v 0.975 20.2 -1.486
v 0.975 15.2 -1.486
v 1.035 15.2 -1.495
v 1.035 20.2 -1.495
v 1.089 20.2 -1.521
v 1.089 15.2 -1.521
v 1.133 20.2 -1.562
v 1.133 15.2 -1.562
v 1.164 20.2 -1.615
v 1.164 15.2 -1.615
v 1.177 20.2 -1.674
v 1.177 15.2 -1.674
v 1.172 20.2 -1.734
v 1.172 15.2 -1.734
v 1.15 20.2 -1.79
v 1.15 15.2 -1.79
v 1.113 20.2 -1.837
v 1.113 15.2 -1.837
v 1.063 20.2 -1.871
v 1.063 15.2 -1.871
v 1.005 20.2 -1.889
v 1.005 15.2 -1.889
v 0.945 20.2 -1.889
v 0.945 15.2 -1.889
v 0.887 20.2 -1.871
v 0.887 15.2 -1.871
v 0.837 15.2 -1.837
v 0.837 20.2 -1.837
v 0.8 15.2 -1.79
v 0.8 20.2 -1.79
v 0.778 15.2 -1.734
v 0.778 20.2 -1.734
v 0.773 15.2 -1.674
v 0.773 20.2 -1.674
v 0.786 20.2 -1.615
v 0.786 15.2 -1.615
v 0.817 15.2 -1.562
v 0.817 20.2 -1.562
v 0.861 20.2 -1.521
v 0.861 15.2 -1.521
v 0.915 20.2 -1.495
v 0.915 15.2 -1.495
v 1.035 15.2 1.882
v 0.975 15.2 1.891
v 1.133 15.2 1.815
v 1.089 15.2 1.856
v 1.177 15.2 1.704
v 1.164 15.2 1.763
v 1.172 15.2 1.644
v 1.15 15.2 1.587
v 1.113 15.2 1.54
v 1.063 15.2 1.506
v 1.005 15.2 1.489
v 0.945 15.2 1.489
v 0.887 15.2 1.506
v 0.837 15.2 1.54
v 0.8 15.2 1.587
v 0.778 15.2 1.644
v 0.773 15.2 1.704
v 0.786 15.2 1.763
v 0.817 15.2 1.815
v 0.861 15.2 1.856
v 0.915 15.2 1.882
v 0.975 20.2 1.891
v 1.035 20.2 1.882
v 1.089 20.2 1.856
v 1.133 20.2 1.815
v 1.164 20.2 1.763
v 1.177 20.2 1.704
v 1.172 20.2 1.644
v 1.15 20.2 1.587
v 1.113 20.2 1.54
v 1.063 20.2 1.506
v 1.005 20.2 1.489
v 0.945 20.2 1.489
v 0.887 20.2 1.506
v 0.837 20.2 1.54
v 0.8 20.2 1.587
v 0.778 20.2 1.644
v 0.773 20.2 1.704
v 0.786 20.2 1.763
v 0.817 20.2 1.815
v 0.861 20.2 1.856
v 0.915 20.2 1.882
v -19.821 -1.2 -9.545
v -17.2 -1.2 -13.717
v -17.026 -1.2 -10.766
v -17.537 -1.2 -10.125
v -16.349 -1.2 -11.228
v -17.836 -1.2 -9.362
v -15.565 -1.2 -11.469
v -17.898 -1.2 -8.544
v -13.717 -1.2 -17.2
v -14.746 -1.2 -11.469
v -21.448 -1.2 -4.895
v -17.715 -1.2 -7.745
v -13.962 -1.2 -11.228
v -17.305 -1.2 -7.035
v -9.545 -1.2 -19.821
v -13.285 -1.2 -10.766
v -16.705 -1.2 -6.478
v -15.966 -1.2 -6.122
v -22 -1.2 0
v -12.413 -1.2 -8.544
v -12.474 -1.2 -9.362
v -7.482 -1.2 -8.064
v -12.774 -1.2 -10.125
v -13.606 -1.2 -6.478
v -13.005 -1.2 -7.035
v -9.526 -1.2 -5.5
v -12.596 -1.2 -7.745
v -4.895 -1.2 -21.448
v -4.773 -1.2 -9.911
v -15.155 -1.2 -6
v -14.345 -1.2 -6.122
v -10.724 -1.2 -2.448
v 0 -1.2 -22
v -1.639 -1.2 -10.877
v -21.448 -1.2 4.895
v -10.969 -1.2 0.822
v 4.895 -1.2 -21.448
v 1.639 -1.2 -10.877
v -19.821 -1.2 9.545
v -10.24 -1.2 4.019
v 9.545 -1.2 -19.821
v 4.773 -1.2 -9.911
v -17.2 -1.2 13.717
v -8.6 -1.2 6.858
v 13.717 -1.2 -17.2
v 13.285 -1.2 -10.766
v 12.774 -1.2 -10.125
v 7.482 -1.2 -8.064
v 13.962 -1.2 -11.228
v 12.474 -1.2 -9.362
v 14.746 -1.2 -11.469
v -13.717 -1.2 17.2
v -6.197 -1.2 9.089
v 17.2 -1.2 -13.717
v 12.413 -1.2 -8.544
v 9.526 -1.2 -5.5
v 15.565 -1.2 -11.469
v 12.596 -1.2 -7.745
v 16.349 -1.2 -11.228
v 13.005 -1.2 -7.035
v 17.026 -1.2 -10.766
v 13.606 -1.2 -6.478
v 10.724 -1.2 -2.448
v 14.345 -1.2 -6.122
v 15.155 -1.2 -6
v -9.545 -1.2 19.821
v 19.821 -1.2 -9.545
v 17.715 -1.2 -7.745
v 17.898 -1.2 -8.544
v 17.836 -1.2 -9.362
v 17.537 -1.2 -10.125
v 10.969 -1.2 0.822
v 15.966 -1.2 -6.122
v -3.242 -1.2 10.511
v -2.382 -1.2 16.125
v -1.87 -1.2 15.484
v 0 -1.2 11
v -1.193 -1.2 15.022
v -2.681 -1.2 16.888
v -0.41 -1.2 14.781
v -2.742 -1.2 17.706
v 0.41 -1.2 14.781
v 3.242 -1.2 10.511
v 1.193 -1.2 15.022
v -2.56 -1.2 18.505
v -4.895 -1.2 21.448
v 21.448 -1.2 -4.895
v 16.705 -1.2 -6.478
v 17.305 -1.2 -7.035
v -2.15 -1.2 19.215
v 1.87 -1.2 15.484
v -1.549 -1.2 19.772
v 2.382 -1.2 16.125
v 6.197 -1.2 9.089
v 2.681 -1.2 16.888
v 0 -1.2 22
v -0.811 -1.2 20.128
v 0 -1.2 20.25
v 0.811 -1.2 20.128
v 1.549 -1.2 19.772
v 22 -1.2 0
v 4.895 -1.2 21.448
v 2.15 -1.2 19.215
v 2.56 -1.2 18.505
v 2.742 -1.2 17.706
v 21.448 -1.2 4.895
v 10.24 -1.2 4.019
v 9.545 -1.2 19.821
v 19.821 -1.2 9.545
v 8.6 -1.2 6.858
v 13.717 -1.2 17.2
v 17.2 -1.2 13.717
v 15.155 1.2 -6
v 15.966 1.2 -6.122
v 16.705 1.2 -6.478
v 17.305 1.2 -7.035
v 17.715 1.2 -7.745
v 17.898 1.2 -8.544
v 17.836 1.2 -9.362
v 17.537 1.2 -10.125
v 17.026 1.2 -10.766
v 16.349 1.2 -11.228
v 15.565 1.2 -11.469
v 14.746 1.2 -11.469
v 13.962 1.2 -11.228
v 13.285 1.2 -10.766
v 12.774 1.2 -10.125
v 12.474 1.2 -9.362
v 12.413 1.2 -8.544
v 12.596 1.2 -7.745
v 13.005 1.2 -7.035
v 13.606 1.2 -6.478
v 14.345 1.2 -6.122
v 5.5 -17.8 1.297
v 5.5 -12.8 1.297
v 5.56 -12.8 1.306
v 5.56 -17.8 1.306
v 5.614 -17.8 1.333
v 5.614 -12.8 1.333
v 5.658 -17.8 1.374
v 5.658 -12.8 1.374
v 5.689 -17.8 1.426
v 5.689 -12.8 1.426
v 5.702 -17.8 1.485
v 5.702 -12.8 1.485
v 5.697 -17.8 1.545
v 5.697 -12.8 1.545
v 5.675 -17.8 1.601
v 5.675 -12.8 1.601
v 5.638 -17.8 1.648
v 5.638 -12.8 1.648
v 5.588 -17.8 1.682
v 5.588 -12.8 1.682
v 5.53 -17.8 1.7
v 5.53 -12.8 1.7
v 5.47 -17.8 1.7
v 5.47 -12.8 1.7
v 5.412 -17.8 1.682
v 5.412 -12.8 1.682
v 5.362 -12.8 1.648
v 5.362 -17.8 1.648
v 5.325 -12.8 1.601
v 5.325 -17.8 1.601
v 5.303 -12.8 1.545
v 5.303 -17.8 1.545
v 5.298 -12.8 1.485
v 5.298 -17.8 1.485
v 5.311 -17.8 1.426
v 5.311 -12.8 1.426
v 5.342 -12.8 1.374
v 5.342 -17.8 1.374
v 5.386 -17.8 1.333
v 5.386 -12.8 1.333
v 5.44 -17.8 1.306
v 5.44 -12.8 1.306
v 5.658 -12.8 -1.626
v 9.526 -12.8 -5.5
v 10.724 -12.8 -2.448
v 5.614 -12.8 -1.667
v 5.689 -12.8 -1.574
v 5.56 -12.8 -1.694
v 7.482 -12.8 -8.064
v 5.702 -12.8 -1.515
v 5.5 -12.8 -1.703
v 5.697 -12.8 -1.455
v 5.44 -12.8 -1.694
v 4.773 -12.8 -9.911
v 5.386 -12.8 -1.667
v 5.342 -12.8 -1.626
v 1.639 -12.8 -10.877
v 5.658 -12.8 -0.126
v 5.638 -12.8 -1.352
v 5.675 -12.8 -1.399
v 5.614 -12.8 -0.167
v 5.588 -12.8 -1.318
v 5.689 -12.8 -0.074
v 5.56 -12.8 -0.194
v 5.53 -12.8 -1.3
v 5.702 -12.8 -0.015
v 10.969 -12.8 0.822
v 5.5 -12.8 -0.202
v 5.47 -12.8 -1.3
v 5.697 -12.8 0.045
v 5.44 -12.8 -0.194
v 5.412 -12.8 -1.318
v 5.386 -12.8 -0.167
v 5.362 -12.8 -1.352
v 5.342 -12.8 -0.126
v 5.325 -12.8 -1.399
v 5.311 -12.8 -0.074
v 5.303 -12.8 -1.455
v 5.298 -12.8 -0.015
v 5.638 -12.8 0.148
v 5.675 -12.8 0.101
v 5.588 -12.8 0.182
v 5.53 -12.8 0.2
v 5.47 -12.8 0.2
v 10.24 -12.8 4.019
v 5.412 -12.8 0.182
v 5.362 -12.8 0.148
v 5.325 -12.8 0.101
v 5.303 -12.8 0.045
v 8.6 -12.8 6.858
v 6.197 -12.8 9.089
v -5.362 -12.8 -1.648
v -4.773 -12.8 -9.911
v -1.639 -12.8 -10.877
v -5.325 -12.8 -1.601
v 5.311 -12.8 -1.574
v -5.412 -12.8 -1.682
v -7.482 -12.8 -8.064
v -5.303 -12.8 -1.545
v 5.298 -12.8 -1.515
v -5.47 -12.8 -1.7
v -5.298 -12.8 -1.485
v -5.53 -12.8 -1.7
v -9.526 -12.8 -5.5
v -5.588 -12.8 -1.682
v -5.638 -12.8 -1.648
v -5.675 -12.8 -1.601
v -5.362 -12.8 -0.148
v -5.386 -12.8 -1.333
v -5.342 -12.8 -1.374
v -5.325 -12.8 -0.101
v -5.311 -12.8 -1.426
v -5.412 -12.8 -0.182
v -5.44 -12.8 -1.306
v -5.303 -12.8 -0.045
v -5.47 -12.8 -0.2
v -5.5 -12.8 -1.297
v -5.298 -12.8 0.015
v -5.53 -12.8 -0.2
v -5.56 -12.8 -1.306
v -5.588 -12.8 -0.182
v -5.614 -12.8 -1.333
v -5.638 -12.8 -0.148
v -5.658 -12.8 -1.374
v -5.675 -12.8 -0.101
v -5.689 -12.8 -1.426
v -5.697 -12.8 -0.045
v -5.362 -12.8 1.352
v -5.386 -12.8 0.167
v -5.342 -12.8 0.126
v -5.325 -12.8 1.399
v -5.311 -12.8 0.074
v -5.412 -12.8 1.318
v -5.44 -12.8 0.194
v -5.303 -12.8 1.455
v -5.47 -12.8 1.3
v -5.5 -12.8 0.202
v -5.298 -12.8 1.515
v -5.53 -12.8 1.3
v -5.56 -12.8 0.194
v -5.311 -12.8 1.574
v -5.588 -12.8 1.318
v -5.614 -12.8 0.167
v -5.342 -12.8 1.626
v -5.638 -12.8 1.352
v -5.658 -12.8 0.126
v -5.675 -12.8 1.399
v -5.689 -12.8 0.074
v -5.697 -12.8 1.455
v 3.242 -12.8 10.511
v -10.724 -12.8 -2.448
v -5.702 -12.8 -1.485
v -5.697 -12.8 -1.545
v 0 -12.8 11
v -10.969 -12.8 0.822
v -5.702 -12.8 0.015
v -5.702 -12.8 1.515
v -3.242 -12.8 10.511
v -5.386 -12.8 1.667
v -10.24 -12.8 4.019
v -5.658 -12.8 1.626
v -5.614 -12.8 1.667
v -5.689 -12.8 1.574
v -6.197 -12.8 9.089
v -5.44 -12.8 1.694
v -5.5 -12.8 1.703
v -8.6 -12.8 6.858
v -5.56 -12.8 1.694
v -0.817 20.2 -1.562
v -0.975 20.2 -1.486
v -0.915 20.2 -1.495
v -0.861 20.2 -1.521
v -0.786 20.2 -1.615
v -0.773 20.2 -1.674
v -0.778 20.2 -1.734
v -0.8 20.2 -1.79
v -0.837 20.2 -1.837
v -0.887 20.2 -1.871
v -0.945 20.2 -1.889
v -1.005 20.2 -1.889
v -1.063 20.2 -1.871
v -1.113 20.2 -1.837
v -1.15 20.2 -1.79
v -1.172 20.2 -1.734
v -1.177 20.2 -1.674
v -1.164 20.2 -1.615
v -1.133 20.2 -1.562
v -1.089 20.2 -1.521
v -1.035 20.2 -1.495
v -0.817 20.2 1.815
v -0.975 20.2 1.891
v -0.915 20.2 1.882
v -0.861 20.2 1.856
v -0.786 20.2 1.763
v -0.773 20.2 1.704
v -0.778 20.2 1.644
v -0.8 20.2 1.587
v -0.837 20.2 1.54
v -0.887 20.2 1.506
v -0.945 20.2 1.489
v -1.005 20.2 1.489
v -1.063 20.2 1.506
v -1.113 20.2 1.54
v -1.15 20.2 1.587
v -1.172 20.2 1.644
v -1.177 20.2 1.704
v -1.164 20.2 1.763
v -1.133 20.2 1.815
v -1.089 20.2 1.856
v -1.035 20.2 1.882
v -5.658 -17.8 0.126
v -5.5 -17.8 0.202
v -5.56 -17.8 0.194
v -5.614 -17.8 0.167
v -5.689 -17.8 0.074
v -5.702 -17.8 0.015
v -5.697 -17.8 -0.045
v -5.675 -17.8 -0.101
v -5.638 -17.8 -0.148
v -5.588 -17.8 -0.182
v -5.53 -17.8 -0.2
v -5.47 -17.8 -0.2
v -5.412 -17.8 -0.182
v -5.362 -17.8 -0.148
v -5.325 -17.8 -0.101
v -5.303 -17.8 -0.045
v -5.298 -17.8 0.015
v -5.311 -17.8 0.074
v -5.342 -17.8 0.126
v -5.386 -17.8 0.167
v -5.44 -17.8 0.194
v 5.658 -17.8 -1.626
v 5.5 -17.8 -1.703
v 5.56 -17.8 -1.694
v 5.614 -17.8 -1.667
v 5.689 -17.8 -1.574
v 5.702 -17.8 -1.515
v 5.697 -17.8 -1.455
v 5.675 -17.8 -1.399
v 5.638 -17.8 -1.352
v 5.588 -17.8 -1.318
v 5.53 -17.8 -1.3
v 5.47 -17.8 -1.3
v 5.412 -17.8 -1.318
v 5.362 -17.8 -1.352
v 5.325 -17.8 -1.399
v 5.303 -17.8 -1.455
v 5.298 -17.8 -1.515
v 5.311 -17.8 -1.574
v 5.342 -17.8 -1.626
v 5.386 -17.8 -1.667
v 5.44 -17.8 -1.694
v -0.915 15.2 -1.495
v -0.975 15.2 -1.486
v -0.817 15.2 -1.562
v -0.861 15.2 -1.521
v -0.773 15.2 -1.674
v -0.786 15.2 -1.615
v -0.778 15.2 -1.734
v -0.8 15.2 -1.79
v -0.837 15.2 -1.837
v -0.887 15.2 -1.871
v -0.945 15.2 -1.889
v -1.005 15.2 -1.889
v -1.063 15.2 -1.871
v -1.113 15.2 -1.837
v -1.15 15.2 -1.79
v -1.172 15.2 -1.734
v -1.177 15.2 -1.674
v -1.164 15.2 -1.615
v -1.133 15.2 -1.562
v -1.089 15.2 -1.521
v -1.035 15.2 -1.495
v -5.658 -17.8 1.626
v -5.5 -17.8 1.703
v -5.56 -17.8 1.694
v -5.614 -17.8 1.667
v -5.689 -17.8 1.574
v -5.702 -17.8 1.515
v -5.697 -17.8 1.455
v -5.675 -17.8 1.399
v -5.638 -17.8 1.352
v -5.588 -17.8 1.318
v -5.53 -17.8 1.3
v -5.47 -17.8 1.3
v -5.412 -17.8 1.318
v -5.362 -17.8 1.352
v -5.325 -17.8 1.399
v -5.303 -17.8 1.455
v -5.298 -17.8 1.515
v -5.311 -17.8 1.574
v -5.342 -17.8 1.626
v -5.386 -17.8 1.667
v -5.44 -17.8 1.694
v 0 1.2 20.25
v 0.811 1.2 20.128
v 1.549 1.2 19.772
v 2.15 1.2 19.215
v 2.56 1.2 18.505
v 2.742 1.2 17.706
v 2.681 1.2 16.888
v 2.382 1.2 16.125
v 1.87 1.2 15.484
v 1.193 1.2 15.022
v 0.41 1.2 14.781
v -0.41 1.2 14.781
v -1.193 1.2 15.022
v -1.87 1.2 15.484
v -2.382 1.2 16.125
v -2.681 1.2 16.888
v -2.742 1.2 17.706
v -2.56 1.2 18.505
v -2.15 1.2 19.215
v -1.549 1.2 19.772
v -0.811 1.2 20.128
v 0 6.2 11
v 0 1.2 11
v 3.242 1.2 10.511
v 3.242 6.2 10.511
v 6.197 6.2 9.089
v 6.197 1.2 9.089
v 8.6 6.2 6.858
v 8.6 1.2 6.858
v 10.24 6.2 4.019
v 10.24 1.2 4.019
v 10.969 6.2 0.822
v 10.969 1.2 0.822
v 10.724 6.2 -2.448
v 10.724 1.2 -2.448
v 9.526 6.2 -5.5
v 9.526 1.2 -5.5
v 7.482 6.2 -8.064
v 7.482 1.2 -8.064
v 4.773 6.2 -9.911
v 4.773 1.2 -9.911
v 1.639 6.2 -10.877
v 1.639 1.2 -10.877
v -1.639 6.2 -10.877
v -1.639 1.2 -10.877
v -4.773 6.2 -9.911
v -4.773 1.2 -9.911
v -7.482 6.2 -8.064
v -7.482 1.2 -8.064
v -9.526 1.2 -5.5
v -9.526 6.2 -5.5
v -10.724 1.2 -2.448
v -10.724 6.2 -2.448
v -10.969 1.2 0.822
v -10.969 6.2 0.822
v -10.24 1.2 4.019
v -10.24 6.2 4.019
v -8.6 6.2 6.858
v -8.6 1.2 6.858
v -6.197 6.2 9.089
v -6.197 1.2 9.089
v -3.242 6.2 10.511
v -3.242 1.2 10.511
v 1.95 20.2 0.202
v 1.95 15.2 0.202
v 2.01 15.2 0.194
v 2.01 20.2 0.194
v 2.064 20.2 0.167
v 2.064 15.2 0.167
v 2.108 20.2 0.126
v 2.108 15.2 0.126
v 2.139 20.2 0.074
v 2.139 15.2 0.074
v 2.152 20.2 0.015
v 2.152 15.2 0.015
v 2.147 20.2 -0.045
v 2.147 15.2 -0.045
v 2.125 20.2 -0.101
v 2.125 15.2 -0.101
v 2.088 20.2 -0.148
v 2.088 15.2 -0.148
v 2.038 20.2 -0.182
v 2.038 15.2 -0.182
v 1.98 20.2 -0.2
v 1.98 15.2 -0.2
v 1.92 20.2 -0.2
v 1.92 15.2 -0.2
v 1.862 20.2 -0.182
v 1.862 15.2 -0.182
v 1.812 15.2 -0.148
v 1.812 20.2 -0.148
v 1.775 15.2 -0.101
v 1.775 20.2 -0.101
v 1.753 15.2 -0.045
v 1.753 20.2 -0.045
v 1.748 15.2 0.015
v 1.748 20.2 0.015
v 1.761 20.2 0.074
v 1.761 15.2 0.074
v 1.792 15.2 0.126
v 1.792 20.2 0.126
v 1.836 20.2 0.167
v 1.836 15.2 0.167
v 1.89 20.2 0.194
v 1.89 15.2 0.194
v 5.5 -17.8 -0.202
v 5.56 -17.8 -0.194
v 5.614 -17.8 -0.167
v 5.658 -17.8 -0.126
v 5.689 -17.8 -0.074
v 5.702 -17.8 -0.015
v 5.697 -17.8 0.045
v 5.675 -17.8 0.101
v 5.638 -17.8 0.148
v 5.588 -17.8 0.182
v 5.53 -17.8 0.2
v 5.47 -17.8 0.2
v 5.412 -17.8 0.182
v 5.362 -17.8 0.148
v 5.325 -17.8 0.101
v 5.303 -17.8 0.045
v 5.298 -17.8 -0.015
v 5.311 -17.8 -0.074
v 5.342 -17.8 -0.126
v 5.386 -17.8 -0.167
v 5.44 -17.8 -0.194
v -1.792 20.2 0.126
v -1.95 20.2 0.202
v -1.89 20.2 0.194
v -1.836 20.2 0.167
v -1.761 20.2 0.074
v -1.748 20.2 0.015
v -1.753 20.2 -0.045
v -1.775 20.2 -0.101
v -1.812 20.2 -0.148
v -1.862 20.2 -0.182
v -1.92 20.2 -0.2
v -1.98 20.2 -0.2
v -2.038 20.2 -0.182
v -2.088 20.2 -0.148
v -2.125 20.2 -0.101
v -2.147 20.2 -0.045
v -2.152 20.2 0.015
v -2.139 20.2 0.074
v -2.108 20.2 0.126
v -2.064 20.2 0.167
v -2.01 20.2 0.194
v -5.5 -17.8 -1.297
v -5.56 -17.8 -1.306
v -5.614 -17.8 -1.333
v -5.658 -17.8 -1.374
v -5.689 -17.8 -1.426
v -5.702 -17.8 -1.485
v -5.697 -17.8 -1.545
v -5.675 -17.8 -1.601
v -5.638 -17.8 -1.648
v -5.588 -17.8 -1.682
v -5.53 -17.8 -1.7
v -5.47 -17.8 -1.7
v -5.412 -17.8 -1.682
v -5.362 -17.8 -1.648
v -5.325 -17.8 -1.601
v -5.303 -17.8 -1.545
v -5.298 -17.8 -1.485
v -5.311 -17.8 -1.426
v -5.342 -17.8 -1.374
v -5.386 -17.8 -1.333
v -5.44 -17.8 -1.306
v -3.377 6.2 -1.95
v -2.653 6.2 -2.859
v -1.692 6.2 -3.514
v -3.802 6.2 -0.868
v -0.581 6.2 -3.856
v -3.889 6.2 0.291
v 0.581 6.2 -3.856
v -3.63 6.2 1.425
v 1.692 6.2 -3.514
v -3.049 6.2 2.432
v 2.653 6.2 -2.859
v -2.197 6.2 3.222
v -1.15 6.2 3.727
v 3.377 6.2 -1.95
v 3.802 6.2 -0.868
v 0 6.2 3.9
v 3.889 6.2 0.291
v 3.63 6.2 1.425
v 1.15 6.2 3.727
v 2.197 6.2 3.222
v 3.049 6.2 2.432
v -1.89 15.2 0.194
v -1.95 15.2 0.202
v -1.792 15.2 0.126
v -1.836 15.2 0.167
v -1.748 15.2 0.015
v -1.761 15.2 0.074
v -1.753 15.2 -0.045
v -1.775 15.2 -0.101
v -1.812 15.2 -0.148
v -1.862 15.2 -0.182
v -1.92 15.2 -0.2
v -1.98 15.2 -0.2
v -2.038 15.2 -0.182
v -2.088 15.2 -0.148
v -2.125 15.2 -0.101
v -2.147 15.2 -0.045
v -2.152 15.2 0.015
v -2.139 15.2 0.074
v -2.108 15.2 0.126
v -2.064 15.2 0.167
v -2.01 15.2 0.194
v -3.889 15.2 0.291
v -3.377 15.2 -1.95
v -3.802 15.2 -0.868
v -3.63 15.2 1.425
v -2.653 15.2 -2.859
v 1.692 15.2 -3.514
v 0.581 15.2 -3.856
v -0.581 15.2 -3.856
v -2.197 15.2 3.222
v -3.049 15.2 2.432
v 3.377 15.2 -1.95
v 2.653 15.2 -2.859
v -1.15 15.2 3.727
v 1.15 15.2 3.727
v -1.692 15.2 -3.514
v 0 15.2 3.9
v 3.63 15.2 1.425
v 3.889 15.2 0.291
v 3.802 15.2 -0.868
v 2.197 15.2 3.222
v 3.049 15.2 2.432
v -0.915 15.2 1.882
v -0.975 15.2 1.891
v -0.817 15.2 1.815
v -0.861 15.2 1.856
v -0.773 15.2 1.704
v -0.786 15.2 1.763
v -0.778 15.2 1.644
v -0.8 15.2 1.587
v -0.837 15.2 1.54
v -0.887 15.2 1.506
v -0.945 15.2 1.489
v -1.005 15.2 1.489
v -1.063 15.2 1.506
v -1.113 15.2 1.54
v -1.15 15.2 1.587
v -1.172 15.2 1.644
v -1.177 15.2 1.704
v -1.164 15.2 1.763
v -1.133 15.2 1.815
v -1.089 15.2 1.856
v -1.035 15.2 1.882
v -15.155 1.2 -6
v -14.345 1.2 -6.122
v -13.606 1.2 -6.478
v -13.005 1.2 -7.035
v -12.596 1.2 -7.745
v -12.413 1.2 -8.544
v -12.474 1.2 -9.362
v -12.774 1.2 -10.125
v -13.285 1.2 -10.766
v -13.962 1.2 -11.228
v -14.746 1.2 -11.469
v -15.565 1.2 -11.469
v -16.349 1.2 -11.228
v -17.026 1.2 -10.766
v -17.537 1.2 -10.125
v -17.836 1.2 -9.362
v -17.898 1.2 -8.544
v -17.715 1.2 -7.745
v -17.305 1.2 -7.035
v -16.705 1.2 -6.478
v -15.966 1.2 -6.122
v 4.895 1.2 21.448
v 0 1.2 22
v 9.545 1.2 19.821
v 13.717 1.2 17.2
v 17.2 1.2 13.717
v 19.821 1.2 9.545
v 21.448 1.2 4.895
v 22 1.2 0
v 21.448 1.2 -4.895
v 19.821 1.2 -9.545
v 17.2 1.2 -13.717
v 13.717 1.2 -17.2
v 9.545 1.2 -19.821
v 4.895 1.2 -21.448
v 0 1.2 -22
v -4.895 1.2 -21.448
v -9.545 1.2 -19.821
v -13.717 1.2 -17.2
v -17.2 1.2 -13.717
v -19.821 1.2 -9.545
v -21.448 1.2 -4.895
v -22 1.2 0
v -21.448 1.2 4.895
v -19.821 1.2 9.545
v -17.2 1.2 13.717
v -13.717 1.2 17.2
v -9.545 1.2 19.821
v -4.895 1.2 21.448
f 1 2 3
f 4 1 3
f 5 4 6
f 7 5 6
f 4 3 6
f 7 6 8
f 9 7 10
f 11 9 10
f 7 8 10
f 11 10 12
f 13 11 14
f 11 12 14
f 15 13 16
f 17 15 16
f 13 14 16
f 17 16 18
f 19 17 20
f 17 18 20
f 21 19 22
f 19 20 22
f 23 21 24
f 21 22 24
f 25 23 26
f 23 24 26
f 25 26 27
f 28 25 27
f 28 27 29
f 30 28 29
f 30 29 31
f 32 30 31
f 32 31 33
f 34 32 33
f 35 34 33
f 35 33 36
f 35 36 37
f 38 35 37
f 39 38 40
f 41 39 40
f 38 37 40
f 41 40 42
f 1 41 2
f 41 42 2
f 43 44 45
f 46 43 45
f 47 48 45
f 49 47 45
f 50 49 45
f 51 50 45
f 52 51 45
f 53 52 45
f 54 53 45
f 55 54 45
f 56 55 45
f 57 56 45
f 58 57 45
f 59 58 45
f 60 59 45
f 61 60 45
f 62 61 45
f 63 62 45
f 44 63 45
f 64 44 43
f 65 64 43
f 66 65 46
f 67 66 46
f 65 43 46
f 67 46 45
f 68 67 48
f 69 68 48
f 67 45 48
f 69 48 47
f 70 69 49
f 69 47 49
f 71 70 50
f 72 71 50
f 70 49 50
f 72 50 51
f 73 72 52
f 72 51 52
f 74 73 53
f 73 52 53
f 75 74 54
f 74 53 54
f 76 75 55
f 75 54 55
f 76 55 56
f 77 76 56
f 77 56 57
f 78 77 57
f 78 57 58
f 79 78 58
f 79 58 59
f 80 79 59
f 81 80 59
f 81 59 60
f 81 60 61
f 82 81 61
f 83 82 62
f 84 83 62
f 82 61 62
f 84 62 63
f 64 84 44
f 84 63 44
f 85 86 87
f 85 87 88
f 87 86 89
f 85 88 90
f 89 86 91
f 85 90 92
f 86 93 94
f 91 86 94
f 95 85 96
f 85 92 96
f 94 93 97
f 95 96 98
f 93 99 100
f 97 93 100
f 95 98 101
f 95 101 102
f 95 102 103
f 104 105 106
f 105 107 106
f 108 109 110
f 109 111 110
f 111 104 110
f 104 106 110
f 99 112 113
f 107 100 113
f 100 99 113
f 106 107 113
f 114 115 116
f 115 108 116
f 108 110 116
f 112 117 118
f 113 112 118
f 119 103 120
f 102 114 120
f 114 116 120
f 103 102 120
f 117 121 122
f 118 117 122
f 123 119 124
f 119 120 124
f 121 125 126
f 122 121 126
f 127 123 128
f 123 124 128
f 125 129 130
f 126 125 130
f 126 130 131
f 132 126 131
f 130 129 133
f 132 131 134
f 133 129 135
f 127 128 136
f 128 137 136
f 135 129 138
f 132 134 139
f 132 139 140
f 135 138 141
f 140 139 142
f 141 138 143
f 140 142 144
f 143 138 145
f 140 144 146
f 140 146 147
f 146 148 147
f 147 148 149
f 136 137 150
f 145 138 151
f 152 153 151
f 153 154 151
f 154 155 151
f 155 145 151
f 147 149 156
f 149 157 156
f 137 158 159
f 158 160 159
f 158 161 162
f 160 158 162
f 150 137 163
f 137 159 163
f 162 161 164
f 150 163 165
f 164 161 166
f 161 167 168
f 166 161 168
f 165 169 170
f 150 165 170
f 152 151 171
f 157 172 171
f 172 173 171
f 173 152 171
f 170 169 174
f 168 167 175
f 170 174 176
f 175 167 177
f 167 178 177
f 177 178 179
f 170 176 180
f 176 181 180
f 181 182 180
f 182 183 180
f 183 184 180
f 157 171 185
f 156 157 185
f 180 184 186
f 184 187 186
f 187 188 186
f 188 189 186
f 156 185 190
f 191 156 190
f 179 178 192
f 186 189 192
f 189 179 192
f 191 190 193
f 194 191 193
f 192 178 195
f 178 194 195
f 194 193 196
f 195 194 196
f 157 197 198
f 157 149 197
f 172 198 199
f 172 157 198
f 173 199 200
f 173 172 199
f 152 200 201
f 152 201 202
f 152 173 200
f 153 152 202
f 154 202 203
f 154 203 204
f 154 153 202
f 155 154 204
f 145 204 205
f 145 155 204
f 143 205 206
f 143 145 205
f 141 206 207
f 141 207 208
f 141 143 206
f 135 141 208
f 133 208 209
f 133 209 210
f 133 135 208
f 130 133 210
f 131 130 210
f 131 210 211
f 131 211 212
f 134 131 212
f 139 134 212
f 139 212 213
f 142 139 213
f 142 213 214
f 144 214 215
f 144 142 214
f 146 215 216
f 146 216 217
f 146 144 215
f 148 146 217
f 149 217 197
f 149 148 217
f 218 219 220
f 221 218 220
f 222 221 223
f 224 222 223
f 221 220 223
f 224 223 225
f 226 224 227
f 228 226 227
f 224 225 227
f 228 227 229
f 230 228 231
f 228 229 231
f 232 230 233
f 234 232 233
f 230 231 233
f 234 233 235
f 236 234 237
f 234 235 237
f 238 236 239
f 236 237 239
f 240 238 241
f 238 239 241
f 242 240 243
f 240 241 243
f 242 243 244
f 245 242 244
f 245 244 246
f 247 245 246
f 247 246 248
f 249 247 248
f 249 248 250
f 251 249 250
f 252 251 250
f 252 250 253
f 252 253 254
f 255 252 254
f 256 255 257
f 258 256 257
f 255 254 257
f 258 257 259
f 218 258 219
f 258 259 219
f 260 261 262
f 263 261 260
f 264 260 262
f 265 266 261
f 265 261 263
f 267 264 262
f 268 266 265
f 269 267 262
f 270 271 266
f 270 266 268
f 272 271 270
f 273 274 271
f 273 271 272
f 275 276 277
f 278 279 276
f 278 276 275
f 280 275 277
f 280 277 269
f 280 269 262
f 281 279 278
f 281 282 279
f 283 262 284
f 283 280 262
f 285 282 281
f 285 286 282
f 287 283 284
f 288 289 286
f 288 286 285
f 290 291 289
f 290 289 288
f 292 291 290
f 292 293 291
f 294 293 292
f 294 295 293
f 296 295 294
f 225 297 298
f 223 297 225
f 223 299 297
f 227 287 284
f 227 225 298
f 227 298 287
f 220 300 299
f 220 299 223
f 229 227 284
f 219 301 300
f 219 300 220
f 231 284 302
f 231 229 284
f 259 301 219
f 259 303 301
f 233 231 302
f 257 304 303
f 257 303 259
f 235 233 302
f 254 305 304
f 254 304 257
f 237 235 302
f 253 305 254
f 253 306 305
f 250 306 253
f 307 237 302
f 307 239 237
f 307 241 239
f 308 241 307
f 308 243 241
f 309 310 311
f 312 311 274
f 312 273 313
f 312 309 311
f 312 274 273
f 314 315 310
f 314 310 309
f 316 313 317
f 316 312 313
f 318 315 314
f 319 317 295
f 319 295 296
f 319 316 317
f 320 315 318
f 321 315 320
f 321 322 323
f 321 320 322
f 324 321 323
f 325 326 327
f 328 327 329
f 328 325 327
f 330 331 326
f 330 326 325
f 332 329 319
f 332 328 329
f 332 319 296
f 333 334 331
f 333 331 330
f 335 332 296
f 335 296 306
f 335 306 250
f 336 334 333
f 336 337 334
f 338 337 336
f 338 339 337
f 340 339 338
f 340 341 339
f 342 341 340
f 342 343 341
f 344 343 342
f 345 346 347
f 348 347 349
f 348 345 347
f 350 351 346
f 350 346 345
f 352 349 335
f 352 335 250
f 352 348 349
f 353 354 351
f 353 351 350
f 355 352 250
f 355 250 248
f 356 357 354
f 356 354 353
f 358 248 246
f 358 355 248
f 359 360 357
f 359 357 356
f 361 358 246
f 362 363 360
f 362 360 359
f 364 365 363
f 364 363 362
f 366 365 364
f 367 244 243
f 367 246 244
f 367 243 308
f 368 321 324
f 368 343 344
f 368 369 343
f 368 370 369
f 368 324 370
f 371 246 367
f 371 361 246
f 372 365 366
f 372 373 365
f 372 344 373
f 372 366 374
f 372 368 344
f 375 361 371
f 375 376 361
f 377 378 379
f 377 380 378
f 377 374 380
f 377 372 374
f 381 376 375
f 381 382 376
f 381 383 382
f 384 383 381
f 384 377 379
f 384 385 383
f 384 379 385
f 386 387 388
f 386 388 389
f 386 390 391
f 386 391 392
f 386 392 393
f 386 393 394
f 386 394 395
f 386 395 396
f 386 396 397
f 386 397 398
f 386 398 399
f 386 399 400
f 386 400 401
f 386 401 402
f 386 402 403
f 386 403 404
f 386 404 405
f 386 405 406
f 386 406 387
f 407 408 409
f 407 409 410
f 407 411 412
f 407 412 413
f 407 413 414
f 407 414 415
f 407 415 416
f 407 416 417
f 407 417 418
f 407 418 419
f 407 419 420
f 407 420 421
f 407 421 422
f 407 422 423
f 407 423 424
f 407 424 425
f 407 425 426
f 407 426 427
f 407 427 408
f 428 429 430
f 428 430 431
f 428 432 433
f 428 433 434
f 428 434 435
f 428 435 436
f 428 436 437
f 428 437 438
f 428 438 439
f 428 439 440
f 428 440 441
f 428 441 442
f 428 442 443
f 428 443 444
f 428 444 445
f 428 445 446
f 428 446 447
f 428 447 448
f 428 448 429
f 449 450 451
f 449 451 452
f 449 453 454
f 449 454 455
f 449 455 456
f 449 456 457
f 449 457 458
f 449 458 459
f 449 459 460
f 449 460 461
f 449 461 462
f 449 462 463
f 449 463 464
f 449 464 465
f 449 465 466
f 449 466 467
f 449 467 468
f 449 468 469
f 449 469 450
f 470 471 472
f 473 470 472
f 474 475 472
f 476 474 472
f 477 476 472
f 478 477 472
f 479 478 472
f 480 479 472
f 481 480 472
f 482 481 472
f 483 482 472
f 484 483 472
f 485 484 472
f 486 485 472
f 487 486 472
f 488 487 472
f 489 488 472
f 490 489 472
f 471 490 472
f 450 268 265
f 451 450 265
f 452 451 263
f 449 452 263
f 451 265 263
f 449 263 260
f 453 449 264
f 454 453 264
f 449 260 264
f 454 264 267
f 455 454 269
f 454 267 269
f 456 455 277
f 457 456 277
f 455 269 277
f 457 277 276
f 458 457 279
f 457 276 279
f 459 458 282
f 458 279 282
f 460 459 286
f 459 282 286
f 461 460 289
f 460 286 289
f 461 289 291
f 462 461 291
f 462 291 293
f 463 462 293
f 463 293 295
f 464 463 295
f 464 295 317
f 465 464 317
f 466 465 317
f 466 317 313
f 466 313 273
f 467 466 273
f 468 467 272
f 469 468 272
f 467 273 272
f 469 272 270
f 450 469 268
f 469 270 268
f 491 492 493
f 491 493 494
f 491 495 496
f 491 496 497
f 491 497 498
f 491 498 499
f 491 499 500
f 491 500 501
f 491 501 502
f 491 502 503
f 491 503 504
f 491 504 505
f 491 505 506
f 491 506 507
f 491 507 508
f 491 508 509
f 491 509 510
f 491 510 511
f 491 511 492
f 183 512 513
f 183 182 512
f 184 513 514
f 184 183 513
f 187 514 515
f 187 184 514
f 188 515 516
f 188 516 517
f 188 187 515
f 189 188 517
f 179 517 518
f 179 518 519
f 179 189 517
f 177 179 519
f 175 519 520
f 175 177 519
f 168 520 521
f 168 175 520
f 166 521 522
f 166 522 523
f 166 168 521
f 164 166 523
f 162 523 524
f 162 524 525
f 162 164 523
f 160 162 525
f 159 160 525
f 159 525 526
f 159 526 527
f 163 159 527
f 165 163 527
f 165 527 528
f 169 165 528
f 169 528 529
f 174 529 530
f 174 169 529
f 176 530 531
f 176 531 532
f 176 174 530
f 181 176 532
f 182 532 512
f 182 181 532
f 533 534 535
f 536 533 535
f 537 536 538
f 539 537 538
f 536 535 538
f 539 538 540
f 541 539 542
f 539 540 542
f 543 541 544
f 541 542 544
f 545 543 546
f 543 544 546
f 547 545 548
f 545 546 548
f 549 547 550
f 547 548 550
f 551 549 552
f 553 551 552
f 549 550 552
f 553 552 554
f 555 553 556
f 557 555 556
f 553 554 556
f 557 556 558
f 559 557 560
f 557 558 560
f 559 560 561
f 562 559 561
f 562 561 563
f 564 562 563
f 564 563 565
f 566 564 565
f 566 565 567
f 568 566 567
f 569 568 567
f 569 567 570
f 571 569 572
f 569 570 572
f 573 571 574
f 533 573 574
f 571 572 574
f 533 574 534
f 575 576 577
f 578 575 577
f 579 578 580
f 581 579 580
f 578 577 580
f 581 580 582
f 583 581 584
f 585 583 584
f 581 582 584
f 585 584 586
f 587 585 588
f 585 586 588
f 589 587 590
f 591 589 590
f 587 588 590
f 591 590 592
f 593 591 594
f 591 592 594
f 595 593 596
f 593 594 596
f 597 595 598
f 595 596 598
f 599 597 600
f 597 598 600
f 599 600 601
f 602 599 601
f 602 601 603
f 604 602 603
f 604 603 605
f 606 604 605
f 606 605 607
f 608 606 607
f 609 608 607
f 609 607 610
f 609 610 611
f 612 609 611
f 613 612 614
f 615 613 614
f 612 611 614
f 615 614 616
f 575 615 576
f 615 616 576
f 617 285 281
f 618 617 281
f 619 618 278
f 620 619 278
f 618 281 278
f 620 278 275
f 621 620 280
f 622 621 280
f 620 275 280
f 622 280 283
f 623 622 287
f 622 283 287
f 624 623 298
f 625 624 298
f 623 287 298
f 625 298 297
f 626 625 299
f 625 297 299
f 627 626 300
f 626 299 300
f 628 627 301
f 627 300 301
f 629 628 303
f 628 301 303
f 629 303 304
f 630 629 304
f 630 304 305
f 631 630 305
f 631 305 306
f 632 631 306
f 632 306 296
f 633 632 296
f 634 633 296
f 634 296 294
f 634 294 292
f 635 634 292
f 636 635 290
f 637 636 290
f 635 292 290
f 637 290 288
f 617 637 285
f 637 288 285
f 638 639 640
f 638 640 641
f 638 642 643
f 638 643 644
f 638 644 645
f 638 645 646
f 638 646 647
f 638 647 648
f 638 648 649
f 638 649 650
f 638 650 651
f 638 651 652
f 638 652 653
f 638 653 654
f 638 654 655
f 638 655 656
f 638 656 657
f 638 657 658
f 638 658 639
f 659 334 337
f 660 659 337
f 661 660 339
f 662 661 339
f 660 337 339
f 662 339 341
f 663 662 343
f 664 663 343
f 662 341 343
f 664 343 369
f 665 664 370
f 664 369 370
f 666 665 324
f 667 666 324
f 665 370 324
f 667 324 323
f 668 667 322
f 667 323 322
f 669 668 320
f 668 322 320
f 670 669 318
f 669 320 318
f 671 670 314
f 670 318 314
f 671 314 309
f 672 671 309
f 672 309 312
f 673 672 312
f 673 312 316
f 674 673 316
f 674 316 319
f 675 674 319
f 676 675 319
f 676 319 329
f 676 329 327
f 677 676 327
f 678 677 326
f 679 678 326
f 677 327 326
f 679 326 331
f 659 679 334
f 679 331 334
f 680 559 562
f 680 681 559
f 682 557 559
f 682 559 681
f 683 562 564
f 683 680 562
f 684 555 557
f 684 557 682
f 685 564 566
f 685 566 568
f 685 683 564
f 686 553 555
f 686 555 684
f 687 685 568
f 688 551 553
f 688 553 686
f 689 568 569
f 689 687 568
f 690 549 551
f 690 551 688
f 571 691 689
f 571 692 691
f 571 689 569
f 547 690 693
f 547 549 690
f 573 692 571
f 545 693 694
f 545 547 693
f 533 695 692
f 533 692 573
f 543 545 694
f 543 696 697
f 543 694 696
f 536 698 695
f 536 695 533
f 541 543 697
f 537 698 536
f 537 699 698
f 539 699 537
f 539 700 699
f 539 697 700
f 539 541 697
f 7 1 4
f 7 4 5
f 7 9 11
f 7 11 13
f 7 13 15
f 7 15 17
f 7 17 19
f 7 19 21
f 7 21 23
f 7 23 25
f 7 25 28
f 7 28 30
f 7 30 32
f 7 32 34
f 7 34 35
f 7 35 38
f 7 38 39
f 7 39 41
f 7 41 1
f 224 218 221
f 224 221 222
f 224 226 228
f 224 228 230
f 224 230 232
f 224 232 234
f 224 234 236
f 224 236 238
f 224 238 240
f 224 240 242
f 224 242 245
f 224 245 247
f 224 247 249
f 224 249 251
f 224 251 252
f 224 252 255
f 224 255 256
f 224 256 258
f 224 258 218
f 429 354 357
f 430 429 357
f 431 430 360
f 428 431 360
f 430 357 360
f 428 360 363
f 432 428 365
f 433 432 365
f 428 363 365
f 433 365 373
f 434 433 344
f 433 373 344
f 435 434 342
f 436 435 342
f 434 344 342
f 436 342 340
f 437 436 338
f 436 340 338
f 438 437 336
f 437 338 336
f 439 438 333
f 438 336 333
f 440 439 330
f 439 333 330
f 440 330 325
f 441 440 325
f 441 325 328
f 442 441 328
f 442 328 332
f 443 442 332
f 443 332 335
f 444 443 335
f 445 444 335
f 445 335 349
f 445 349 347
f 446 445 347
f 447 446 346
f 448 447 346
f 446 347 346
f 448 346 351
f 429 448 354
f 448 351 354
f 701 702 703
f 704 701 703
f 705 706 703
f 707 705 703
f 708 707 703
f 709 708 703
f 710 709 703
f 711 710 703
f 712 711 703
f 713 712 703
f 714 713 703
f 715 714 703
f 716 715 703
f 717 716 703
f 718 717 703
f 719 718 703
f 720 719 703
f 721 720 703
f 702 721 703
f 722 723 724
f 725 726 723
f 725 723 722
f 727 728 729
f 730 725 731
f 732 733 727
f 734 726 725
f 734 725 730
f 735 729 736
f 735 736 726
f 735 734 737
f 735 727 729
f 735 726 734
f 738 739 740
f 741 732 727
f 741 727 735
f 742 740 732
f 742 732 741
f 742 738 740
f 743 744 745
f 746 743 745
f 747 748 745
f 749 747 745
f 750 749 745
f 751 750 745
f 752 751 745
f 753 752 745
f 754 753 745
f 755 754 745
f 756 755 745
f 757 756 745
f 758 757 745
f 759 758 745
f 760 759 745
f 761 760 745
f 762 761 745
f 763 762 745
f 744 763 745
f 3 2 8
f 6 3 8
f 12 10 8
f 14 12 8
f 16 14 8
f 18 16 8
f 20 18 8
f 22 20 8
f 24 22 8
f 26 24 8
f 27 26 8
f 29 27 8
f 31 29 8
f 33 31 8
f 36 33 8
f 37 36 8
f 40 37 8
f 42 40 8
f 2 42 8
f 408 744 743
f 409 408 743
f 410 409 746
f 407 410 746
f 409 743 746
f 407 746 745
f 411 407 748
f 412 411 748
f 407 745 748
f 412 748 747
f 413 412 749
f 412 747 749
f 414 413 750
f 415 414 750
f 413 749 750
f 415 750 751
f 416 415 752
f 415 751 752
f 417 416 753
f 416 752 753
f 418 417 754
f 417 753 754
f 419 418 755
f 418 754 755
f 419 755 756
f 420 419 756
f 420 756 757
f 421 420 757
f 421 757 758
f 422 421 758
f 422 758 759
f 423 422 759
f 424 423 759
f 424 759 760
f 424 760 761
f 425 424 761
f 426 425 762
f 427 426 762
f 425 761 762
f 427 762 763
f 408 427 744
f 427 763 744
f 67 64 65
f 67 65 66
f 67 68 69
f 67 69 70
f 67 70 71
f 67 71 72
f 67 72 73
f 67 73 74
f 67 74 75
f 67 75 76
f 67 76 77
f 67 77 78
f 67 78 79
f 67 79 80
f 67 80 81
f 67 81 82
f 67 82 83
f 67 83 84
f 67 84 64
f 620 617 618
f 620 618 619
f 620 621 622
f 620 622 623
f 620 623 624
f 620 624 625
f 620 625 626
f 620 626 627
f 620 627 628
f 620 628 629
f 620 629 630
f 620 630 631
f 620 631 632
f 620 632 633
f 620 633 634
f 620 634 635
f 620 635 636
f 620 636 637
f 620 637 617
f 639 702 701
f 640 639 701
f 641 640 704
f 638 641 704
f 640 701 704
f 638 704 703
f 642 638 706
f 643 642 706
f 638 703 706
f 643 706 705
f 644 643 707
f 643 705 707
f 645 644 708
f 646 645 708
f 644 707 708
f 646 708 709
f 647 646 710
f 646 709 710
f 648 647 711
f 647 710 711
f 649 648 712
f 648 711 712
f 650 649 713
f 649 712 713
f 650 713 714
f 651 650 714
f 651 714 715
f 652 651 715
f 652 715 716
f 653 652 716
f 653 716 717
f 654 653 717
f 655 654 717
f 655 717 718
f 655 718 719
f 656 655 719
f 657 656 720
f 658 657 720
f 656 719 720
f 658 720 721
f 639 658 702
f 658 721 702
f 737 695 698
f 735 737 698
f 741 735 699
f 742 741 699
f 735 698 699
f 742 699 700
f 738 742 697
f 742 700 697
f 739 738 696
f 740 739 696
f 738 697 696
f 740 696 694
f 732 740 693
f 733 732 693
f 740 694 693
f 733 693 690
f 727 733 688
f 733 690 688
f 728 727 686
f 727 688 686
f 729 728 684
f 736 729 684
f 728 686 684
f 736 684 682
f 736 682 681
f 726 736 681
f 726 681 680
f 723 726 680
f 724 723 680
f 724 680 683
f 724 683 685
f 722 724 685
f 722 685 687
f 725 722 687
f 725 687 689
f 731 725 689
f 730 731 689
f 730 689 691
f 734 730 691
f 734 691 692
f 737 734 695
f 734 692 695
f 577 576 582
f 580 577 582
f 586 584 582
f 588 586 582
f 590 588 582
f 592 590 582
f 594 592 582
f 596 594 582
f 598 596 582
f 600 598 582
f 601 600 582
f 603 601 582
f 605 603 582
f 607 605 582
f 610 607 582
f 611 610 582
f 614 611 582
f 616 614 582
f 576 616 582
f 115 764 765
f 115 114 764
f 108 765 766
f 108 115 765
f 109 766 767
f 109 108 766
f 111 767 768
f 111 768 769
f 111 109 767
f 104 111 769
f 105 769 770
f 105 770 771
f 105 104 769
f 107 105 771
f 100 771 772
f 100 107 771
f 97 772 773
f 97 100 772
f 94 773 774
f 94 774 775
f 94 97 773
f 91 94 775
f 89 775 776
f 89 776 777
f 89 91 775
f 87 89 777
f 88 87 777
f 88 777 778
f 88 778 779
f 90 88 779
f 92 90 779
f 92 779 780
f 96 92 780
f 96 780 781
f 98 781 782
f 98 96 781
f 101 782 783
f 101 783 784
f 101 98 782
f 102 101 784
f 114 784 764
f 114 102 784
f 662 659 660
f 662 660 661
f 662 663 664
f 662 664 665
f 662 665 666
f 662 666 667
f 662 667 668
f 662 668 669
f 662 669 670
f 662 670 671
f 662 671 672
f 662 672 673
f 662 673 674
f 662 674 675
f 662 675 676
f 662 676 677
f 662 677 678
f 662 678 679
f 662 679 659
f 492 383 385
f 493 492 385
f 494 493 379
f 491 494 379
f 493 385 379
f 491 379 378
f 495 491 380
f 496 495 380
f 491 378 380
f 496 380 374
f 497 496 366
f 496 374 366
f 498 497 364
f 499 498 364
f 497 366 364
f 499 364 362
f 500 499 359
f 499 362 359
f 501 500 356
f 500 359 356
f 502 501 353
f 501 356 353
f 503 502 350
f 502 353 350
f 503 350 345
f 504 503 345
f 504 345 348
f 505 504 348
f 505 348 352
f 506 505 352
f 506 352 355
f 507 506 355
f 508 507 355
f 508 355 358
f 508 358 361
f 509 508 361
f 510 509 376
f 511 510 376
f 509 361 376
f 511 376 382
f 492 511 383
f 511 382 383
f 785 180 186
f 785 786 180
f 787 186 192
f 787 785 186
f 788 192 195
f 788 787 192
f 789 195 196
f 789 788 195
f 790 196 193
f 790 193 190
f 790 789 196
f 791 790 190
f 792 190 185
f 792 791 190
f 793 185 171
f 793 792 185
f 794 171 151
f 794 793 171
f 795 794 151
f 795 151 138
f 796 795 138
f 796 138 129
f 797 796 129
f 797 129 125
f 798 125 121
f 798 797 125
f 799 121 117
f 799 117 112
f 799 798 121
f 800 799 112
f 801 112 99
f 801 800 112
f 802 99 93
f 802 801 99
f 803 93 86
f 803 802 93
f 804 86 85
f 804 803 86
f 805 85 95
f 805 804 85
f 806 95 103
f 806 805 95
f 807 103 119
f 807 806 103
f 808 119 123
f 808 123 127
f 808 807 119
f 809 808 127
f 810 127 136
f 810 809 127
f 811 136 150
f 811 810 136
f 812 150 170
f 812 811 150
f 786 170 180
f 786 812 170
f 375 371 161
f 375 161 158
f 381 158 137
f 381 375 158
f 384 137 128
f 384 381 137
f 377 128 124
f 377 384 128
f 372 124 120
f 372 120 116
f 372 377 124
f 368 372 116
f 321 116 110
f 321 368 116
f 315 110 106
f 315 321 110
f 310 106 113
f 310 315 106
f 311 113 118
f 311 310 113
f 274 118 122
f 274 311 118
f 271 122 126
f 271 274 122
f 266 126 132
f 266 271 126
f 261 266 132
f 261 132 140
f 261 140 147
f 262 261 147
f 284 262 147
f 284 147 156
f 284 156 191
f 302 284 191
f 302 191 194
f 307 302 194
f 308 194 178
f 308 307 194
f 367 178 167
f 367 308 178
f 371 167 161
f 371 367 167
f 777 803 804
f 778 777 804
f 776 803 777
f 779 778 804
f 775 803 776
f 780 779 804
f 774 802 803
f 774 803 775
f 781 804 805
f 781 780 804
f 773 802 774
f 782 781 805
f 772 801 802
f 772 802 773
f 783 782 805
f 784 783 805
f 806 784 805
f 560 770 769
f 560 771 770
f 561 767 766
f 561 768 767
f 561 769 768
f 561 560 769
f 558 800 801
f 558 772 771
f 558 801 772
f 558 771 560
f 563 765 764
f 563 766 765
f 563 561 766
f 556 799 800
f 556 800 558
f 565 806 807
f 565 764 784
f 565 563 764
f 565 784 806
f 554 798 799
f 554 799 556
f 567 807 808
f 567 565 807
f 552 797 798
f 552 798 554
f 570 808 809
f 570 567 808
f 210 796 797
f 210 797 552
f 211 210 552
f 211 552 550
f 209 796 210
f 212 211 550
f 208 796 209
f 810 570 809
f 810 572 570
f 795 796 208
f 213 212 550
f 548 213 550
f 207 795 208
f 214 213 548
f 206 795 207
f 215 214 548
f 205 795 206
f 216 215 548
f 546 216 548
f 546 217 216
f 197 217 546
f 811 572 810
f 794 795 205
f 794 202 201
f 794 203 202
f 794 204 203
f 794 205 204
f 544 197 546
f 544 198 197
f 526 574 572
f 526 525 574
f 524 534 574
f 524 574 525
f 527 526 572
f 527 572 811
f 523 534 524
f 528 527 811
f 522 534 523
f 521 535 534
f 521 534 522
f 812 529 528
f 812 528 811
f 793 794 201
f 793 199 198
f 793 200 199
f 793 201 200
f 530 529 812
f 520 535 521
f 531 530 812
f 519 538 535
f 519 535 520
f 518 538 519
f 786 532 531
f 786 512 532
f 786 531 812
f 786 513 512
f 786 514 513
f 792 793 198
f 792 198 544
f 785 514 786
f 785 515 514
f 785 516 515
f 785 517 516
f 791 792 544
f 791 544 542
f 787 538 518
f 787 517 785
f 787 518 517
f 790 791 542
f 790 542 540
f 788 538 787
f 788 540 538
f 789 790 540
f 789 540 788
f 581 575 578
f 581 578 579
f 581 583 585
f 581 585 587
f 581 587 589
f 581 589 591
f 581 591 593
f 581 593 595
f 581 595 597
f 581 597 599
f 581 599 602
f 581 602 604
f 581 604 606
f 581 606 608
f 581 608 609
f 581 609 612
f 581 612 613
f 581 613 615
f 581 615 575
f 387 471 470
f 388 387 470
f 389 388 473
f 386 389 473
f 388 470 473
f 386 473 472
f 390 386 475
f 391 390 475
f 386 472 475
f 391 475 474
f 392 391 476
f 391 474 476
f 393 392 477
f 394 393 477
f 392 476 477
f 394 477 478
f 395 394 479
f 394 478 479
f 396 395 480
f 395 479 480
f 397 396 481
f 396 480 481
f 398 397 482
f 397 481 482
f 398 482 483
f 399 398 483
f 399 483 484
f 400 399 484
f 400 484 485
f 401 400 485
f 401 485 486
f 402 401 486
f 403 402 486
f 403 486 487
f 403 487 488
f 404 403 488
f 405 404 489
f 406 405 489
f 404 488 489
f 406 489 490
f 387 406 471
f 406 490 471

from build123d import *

# Parameters (mm, degrees)
CROQUIS1_R                = 22
CROQUIS1_R_2              = 2.75
SALIENTE_EXTRUIR1_DEPTH   = 1.2
CROQUIS3_R                = 11
SALIENTE_EXTRUIR2_DEPTH   = 5
CROQUIS4_R                = 3.9
SALIENTE_EXTRUIR3_DEPTH   = 9
SALIENTE_EXTRUIR4_START   = 11.6
CROQUIS5_R                = 11
SALIENTE_EXTRUIR4_DEPTH   = 11.6
CROQUIS6_R                = 0.2025
SALIENTE_EXTRUIR5_DEPTH   = 5
SALIENTE_EXTRUIR5_2_DEPTH = 5
SALIENTE_EXTRUIR5_3_DEPTH = 5
SALIENTE_EXTRUIR5_4_DEPTH = 5
SALIENTE_EXTRUIR5_5_DEPTH = 5
SALIENTE_EXTRUIR5_6_DEPTH = 5
CROQUIS7_R                = 0.2025
SALIENTE_EXTRUIR6_DEPTH   = 5


with BuildPart() as part:
    # Croquis1 → Saliente-Extruir1 (new, symmetric)
    with BuildSketch(Plane(origin=(0, 0, 0), x_dir=(1, 0, 0), z_dir=(0, 1, 0))):
        with Locations(Location((0, 0, 0), (0, 0, 270))):
            Circle(CROQUIS1_R)
        with Locations(Location((15.155444566, 8.75, 0), (0, 0, 270))):
            Circle(CROQUIS1_R_2, mode=Mode.SUBTRACT)
        with Locations(Location((0, -17.5, 0), (0, 0, 270))):
            Circle(CROQUIS1_R_2, mode=Mode.SUBTRACT)
        with Locations(Location((-15.155444566, 8.75, 0), (0, 0, 270))):
            Circle(CROQUIS1_R_2, mode=Mode.SUBTRACT)
    extrude(amount=SALIENTE_EXTRUIR1_DEPTH, both=True)

    # Croquis3 → Saliente-Extruir2 (add)
    with BuildSketch(Plane(origin=(0, 1.2, 0), x_dir=(1, 0, 0), z_dir=(0, 1, 0))):
        with Locations(Location((0, 0, 0), (0, 0, 270))):
            Circle(CROQUIS3_R)
    extrude(amount=SALIENTE_EXTRUIR2_DEPTH)

    # Croquis4 → Saliente-Extruir3 (add)
    with BuildSketch(Plane(origin=(0, 6.2, 0), x_dir=(1, 0, 0), z_dir=(0, 1, 0))):
        with Locations(Location((0, 0, 0), (0, 0, 270))):
            Circle(CROQUIS4_R)
    extrude(amount=SALIENTE_EXTRUIR3_DEPTH)

    # Croquis5 → Saliente-Extruir4 (add)
    with BuildSketch(Plane.XZ.offset(1.2).offset(SALIENTE_EXTRUIR4_START)):
        with Locations(Location((0, 0, 0), (0, 0, 90))):
            Circle(CROQUIS5_R)
    extrude(amount=-SALIENTE_EXTRUIR4_DEPTH)

    # Croquis7 → Saliente-Extruir6 (add)
    with BuildSketch(Plane.XZ.offset(12.8)):
        with Locations(Location((5.5, 0, 0), (0, 0, 270))):
            Circle(CROQUIS7_R)
        with Locations(Location((5.5, 1.5, 0), (0, 0, 270))):
            Circle(CROQUIS7_R)
        with Locations(Location((5.5, -1.5, 0), (0, 0, 270))):
            Circle(CROQUIS7_R)
        with Locations(Location((-5.5, -1.5, 0), (0, 0, 90))):
            Circle(CROQUIS7_R)
        with Locations(Location((-5.5, 0, 0), (0, 0, 90))):
            Circle(CROQUIS7_R)
        with Locations(Location((-5.5, 1.5, 0), (0, 0, 90))):
            Circle(CROQUIS7_R)
    extrude(amount=SALIENTE_EXTRUIR6_DEPTH)


with BuildPart() as body_2:
    # Croquis6 → Saliente-Extruir5 (new body)
    with BuildSketch(Plane(origin=(0, 15.2, 0), x_dir=(1, 0, 0), z_dir=(0, 1, 0))):
        with Locations(Location((1.95, 0, 0), (0, 0, 270))):
            Circle(CROQUIS6_R)
    extrude(amount=SALIENTE_EXTRUIR5_DEPTH)


with BuildPart() as body_3:
    # Croquis6 → Saliente-Extruir5 2 (new body)
    with BuildSketch(Plane(origin=(0, 15.2, 0), x_dir=(1, 0, 0), z_dir=(0, 1, 0))):
        with Locations(Location((0.975, -1.688749537, 0), (0, 0, 270))):
            Circle(CROQUIS6_R)
    extrude(amount=SALIENTE_EXTRUIR5_2_DEPTH)


with BuildPart() as body_4:
    # Croquis6 → Saliente-Extruir5 3 (new body)
    with BuildSketch(Plane(origin=(0, 15.2, 0), x_dir=(1, 0, 0), z_dir=(0, 1, 0))):
        with Locations(Location((-0.975, -1.688749537, 0), (0, 0, 270))):
            Circle(CROQUIS6_R)
    extrude(amount=SALIENTE_EXTRUIR5_3_DEPTH)


with BuildPart() as body_5:
    # Croquis6 → Saliente-Extruir5 4 (new body)
    with BuildSketch(Plane(origin=(0, 15.2, 0), x_dir=(1, 0, 0), z_dir=(0, 1, 0))):
        with Locations(Location((-1.95, 0, 0), (0, 0, 270))):
            Circle(CROQUIS6_R)
    extrude(amount=SALIENTE_EXTRUIR5_4_DEPTH)


with BuildPart() as body_6:
    # Croquis6 → Saliente-Extruir5 5 (new body)
    with BuildSketch(Plane(origin=(0, 15.2, 0), x_dir=(1, 0, 0), z_dir=(0, 1, 0))):
        with Locations(Location((-0.975, 1.688749537, 0), (0, 0, 270))):
            Circle(CROQUIS6_R)
    extrude(amount=SALIENTE_EXTRUIR5_5_DEPTH)


with BuildPart() as body_7:
    # Croquis6 → Saliente-Extruir5 6 (new body)
    with BuildSketch(Plane(origin=(0, 15.2, 0), x_dir=(1, 0, 0), z_dir=(0, 1, 0))):
        with Locations(Location((0.975, 1.688749537, 0), (0, 0, 270))):
            Circle(CROQUIS6_R)
    extrude(amount=SALIENTE_EXTRUIR5_6_DEPTH)


solid = Compound([part.part, body_2.part, body_3.part, body_4.part, body_5.part, body_6.part, body_7.part])
